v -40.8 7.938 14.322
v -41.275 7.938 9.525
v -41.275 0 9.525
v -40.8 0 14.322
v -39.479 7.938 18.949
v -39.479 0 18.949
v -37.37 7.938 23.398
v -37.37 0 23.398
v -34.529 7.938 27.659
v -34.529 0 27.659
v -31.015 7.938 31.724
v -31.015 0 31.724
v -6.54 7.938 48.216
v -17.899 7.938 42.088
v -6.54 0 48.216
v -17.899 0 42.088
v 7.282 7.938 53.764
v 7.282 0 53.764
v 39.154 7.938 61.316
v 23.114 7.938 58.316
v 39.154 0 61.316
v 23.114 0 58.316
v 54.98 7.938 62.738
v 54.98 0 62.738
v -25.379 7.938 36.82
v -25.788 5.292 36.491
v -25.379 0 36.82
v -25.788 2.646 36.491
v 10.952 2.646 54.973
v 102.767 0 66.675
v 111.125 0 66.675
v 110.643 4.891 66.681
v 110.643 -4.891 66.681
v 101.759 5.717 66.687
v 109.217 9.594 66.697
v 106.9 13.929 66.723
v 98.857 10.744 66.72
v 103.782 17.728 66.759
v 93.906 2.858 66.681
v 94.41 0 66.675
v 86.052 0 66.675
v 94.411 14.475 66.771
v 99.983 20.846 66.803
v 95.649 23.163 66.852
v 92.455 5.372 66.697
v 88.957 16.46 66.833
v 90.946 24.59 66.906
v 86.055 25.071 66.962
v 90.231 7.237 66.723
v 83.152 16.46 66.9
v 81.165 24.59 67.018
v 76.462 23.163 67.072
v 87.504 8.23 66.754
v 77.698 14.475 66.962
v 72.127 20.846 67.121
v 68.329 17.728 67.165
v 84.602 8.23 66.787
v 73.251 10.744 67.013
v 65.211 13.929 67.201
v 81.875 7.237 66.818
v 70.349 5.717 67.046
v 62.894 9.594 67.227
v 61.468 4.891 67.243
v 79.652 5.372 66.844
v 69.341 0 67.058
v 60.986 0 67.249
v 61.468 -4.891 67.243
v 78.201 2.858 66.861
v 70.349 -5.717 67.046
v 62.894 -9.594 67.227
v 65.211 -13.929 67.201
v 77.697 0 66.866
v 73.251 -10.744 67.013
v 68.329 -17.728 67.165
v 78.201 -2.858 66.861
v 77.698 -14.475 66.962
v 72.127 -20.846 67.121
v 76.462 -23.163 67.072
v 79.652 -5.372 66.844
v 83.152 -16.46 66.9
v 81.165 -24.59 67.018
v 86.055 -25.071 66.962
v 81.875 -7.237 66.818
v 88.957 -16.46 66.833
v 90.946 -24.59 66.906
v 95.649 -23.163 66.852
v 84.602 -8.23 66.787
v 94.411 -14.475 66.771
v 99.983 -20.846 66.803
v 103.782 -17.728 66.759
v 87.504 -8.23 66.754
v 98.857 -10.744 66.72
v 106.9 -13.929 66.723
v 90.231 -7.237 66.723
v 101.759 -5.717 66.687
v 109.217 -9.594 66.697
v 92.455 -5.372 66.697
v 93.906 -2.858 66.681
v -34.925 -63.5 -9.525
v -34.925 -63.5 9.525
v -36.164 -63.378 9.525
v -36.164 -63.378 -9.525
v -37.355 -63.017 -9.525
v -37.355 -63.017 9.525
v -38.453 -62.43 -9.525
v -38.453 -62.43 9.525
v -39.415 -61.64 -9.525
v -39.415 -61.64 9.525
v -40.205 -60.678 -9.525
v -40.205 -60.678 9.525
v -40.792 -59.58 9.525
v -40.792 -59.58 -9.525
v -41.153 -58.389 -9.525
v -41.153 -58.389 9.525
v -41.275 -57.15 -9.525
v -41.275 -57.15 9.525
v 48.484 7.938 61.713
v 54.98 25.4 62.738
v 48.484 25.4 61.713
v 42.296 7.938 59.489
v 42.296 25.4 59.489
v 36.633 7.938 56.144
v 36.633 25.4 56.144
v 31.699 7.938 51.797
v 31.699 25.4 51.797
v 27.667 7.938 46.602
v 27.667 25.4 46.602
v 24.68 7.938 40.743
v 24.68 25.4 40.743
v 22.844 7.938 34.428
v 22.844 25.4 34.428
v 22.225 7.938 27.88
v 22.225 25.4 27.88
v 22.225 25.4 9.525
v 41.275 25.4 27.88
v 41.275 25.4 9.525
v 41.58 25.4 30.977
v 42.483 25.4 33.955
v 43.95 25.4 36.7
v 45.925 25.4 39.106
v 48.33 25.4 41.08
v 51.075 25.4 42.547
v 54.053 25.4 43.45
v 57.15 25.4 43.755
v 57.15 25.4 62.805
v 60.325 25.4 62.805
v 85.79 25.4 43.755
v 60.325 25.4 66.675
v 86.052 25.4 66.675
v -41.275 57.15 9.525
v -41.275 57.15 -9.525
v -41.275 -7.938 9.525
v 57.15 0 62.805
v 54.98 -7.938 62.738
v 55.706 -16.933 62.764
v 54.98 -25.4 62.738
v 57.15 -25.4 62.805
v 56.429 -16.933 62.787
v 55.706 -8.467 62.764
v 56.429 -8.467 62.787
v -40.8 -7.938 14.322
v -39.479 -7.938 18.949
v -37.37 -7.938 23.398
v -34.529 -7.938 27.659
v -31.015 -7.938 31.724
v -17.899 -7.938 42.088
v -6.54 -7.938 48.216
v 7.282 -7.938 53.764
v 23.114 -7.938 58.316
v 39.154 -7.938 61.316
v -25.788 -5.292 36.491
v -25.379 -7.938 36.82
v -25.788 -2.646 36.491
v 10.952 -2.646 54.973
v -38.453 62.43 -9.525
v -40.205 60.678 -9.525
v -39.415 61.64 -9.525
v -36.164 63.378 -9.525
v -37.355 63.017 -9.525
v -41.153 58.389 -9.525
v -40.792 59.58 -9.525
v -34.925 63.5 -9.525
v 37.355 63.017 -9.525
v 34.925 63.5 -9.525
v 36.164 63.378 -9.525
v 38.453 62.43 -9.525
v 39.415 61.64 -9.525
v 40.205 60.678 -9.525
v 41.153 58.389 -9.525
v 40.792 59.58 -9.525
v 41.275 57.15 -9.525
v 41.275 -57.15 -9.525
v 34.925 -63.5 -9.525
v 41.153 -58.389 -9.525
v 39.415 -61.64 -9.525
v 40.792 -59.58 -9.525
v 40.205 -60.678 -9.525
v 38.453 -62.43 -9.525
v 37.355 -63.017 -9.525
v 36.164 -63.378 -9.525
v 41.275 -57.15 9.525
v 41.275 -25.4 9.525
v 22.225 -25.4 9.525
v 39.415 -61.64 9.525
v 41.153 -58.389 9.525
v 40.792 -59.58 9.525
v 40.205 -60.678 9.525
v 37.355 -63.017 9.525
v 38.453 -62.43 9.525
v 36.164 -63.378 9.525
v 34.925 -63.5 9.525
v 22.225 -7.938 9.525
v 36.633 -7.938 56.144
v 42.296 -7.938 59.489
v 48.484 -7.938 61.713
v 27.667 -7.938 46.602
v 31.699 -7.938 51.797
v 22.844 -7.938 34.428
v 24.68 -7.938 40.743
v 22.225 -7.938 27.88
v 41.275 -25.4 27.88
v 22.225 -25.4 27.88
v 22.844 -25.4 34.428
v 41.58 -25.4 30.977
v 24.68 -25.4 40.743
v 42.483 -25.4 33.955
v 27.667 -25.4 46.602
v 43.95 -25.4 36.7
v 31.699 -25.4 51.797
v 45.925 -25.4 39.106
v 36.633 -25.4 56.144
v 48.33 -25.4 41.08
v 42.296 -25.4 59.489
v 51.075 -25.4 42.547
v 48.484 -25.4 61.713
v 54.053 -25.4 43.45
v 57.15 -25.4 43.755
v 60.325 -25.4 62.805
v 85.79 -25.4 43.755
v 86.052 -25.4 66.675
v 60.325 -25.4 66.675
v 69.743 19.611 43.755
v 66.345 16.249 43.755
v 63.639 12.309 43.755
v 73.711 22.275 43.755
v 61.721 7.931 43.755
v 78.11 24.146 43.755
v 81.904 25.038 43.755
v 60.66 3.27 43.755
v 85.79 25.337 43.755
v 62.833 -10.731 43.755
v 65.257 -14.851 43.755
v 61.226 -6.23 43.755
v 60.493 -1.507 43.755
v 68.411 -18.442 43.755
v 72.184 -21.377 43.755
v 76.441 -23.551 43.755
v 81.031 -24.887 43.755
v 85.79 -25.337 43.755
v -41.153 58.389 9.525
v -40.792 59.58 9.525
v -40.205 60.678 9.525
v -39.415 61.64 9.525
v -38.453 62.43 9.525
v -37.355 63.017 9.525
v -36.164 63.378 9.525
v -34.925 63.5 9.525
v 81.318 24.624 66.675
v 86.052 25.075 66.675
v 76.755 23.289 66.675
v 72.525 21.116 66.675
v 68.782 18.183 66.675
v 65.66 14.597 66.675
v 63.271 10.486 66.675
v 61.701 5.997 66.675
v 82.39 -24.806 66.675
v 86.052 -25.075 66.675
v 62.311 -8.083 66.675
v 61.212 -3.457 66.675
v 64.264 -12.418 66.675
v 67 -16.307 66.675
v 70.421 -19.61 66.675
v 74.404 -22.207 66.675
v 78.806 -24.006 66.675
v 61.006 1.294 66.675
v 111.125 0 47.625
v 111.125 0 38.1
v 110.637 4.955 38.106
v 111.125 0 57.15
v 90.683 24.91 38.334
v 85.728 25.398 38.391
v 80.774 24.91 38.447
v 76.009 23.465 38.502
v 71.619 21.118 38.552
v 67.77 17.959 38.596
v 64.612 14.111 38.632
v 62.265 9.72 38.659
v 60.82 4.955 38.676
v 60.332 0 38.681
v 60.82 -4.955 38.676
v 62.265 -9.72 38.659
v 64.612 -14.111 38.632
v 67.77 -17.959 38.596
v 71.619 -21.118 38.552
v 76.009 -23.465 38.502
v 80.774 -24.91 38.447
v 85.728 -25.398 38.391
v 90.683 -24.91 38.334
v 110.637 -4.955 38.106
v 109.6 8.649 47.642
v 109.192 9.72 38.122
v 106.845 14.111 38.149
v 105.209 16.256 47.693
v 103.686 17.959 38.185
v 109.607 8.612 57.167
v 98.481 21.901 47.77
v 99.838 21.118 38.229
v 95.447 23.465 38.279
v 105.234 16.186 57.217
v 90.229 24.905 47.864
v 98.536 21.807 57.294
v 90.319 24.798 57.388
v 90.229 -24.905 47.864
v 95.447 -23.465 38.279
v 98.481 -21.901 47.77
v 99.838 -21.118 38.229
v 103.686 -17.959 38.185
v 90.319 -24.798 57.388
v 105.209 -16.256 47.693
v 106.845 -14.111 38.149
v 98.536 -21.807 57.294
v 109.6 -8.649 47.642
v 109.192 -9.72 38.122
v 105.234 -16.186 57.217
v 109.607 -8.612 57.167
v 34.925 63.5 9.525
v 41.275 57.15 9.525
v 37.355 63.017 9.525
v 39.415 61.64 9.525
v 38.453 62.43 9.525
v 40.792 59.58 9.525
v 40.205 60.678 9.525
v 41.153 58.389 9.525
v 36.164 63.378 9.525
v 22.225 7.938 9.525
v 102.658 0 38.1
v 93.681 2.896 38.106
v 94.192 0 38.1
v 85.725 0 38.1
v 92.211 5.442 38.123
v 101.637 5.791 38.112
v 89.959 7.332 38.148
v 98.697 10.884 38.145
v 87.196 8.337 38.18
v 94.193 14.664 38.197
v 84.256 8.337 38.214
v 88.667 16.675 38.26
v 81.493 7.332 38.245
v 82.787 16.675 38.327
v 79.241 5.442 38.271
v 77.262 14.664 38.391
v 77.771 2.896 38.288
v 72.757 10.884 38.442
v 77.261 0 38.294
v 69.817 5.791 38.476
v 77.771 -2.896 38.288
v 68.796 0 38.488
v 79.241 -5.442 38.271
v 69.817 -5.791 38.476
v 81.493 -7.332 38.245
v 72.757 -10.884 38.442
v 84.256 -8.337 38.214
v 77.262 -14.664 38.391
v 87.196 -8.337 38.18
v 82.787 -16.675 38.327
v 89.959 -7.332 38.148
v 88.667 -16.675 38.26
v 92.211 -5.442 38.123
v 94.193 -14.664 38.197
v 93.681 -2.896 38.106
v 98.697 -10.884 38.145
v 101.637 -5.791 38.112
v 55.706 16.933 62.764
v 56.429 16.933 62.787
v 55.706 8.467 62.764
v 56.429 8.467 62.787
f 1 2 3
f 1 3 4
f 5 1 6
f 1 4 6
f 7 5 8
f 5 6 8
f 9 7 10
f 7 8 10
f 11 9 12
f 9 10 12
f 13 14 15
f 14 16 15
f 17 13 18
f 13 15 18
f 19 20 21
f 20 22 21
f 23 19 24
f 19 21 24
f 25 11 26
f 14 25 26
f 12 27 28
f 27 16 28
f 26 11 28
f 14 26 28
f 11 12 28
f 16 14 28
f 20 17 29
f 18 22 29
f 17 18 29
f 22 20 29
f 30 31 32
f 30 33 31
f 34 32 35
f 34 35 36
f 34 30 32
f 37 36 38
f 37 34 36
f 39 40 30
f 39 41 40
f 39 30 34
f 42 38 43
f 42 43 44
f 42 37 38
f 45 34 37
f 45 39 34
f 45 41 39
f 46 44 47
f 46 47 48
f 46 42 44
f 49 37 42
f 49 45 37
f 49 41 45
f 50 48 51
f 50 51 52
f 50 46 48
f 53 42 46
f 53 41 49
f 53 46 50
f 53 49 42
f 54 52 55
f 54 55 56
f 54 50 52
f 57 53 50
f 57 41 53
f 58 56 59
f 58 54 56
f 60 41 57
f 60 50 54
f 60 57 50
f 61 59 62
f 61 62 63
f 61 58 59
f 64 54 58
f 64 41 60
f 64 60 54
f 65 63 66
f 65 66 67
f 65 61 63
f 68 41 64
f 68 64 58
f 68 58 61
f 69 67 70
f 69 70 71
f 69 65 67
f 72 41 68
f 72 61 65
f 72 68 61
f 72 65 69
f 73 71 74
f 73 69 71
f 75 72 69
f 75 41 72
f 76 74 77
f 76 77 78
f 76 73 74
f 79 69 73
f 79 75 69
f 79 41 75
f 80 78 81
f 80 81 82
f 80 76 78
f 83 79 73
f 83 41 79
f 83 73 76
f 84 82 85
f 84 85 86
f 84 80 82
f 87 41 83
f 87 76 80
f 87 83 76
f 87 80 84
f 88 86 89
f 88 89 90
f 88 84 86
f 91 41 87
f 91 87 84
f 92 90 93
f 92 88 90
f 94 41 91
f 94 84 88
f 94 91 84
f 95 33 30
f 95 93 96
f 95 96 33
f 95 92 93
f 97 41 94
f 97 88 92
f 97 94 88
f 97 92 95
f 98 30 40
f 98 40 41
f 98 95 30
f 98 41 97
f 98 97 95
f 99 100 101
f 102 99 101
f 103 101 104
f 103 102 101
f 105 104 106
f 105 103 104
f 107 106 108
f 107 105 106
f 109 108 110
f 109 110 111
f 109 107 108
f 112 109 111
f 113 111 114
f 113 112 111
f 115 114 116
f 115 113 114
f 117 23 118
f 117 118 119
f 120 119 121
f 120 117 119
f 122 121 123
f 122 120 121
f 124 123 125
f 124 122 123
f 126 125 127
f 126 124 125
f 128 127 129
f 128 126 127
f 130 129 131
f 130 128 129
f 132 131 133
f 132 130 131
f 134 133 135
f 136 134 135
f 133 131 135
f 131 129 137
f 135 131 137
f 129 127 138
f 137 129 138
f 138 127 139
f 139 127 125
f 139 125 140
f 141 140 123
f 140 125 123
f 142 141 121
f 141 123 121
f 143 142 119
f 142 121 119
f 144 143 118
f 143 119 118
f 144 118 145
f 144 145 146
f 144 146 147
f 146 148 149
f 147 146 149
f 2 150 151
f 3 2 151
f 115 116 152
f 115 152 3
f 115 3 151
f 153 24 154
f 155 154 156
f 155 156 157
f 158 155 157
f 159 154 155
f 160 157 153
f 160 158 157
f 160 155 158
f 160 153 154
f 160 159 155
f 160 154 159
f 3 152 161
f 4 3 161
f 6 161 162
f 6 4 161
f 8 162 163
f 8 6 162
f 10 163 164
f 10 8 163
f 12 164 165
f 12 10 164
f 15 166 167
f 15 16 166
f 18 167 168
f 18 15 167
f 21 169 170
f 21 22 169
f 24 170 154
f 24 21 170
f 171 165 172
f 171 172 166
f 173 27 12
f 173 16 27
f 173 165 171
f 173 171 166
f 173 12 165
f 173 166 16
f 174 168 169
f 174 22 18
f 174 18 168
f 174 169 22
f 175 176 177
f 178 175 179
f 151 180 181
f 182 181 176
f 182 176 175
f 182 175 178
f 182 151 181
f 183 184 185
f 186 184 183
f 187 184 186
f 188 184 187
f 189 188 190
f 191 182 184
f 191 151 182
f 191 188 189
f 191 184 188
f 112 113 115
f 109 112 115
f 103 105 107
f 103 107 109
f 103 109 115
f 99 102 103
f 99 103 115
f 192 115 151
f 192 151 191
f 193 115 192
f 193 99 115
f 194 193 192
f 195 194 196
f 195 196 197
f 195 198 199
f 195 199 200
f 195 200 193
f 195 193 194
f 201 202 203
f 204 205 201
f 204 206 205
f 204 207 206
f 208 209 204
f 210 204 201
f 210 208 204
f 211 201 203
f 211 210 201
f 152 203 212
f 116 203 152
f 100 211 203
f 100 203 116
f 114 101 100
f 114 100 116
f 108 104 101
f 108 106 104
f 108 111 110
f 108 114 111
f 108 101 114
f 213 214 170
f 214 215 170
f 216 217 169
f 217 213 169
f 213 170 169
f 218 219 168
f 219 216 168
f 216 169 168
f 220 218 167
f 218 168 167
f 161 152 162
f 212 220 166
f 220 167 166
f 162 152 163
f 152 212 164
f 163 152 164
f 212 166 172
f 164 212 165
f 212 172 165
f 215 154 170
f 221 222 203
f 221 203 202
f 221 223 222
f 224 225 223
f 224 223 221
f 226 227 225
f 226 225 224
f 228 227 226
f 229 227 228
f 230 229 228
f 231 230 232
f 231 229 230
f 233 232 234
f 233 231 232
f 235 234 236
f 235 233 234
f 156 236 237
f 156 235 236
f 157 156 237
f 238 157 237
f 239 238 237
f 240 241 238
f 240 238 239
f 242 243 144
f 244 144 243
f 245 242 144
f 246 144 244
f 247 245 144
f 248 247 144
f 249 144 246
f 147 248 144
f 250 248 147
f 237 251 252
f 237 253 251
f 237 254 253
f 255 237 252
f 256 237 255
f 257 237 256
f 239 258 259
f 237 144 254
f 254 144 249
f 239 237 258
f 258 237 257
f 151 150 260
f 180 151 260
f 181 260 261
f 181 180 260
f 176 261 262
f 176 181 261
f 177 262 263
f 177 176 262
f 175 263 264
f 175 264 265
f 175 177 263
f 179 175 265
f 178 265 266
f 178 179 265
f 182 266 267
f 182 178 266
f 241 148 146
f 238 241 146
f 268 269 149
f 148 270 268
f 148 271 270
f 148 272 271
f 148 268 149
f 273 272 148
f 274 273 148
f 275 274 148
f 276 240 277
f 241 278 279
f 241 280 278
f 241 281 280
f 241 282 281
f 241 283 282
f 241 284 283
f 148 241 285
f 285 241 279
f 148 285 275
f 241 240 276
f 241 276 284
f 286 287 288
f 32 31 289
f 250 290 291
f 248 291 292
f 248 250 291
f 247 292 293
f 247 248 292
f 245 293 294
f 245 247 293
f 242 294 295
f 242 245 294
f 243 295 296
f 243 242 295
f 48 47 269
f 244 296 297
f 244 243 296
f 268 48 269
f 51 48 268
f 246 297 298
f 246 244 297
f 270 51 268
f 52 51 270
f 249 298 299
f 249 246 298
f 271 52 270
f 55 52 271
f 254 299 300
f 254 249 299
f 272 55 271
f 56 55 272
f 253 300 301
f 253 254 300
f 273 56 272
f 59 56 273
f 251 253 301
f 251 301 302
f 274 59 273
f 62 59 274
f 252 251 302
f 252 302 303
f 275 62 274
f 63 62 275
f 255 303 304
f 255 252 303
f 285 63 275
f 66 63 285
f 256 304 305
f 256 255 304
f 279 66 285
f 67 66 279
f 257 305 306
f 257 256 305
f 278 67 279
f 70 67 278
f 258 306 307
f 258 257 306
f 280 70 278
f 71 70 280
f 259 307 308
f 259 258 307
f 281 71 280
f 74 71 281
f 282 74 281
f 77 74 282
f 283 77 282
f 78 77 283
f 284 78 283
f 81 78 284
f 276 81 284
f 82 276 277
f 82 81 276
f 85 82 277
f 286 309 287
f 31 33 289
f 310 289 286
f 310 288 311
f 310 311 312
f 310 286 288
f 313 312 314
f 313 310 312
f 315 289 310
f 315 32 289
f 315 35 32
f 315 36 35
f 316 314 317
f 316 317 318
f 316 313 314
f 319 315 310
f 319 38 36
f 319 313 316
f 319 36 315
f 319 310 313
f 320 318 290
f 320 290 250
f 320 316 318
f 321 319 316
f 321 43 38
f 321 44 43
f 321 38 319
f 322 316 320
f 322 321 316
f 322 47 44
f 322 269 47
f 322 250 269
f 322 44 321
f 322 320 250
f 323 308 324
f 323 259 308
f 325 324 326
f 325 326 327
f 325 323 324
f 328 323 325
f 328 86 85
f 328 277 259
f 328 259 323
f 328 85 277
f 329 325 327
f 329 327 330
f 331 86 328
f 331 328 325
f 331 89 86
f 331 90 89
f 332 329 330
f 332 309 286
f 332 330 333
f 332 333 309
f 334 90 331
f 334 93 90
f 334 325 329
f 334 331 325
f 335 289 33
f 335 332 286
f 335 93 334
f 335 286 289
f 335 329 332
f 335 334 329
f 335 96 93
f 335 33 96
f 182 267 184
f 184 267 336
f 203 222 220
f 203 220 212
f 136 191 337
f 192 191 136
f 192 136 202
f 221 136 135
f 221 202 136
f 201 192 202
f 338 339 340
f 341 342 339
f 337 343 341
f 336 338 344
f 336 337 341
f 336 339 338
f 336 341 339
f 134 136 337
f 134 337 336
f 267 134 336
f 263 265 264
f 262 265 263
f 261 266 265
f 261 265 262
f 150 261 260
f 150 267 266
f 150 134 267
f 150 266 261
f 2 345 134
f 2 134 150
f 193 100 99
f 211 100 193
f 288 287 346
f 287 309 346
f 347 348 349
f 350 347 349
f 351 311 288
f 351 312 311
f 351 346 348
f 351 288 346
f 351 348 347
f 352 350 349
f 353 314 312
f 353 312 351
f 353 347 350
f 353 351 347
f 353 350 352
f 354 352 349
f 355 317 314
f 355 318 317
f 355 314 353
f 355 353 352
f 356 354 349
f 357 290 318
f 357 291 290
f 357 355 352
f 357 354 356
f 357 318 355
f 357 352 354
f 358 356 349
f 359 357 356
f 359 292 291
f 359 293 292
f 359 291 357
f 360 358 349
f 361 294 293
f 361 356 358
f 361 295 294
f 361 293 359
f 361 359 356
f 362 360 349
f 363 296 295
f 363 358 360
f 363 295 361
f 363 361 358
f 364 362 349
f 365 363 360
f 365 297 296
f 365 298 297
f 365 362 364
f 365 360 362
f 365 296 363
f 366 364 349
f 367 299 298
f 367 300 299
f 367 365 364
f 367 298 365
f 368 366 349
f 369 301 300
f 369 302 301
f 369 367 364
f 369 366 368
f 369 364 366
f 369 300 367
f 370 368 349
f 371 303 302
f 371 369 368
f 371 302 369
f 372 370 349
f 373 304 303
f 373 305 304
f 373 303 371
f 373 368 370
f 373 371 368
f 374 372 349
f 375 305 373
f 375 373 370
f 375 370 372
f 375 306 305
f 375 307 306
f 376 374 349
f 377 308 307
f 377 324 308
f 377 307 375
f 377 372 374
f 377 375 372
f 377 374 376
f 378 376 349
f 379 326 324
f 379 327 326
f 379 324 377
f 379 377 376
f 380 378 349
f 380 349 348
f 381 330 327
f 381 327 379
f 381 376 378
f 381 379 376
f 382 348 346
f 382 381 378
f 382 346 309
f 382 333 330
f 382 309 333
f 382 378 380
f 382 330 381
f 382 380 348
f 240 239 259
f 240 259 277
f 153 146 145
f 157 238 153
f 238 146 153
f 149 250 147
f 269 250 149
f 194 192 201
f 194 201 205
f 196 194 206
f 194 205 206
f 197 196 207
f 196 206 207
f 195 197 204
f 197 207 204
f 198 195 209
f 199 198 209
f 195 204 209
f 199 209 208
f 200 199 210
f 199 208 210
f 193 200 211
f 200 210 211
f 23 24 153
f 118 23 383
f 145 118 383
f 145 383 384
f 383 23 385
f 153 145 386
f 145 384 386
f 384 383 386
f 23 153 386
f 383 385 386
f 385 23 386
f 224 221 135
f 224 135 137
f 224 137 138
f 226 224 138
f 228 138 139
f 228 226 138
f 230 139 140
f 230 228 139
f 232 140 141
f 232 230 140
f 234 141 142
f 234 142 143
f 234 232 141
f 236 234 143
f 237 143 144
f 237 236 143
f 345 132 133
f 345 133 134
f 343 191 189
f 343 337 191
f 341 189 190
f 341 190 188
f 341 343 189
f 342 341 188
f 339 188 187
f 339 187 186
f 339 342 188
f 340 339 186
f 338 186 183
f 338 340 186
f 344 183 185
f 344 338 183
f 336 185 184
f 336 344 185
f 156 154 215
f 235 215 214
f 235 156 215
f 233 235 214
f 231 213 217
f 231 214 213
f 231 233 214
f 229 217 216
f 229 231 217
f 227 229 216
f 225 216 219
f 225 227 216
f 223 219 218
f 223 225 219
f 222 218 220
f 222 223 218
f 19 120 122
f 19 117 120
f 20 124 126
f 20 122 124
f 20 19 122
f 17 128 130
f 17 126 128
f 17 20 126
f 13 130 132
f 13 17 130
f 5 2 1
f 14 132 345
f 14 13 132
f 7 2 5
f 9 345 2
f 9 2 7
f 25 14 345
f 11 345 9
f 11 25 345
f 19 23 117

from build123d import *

# Parameters (mm, degrees)
F1_DEPTH = 63.5
F2_DEPTH = 25.4
F3_DEPTH = 7.9375
F5_R     = 6.35


with BuildPart() as f1:
    # F0 (on Front) → F1 (new body, symmetric)
    with BuildSketch(Plane.XZ):
        Polygon((22.225, 9.525), (-41.275, 9.525), (-41.275, -9.525), (41.275, -9.525), (41.275, 9.525), align=None)
    extrude(amount=F1_DEPTH, both=True)

    # F0 (on Front) → F2 (join, symmetric)
    with BuildSketch(Plane.XZ):
        with BuildLine():
            Line((22.225, 27.8803942589), (22.225, 9.525))
            Line((22.225, 9.525), (41.275, 9.525))
            Line((41.275, 9.525), (41.275, 27.8803942589))
            ThreePointArc((41.275, 27.8803942589), (45.9246798487, 39.1057144102), (57.15, 43.7553942589))
            Line((57.15, 43.7553942589), (60.325, 43.7553942589))
            Line((60.325, 43.7553942589), (60.325, 62.8053942589))
            Line((60.325, 62.8053942589), (57.15, 62.8053942589))
            add(Edge.make_bspline(
                [(54.9804315881, 62.7379414747), (55.7065758569, 62.765977986), (56.4298660875, 62.7884783704), (57.15, 62.8053942589)],
                knots=[110.0629711844, 110.0629711844, 110.0629711844, 110.0629711844, 111.9208695346, 111.9208695346, 111.9208695346, 111.9208695346], degree=3))
            ThreePointArc((54.9804315881, 62.7379414747), (31.6987937242, 51.7967427282), (22.225, 27.8803942589))
        make_face()
        Polygon((60.325, 66.675), (60.325, 62.8053942589), (60.325, 43.7553942589), (85.7897415942, 43.7553942589), (86.0521197319, 66.675), align=None)
    extrude(amount=F2_DEPTH, both=True)

    # F0 (on Front) → F3 (join, symmetric)
    with BuildSketch(Plane.XZ):
        with BuildLine():
            add(Edge.make_bspline(
                [(-41.275, 9.525), (-41.0700733104, 39.9874044881), (11.9632257601, 61.0770423539), (54.9804315881, 62.7379414747)],
                knots=[0, 0, 0, 0, 110.0629711844, 110.0629711844, 110.0629711844, 110.0629711844], degree=3))
            Line((-41.275, 9.525), (22.225, 9.525))
            Line((22.225, 9.525), (22.225, 27.8803942589))
            ThreePointArc((22.225, 27.8803942589), (31.6987937242, 51.7967427282), (54.9804315881, 62.7379414747))
        make_face()
    extrude(amount=F3_DEPTH, both=True)

    # F0 (on Front) → F4 (revolve)
    with BuildSketch(Plane.XZ):
        Polygon((86.0521197319, 66.675), (85.7897415942, 43.7553942589), (85.725, 38.1), (111.125, 38.1), (111.125, 66.675), align=None)
    revolve(axis=Axis((85.888559866, 0, 52.3875), (0.0114470096, 0, 0.9999344808)))

    # F5
    f5_edges = [f1.edges().sort_by_distance(p)[0] for p in [
        (41.275, -63.5, 0),
        (-41.275, -63.5, 0),
        (-41.275, 63.5, 0),
        (41.275, 63.5, 0),
    ]]
    fillet(f5_edges, radius=F5_R)


solid = f1.part
